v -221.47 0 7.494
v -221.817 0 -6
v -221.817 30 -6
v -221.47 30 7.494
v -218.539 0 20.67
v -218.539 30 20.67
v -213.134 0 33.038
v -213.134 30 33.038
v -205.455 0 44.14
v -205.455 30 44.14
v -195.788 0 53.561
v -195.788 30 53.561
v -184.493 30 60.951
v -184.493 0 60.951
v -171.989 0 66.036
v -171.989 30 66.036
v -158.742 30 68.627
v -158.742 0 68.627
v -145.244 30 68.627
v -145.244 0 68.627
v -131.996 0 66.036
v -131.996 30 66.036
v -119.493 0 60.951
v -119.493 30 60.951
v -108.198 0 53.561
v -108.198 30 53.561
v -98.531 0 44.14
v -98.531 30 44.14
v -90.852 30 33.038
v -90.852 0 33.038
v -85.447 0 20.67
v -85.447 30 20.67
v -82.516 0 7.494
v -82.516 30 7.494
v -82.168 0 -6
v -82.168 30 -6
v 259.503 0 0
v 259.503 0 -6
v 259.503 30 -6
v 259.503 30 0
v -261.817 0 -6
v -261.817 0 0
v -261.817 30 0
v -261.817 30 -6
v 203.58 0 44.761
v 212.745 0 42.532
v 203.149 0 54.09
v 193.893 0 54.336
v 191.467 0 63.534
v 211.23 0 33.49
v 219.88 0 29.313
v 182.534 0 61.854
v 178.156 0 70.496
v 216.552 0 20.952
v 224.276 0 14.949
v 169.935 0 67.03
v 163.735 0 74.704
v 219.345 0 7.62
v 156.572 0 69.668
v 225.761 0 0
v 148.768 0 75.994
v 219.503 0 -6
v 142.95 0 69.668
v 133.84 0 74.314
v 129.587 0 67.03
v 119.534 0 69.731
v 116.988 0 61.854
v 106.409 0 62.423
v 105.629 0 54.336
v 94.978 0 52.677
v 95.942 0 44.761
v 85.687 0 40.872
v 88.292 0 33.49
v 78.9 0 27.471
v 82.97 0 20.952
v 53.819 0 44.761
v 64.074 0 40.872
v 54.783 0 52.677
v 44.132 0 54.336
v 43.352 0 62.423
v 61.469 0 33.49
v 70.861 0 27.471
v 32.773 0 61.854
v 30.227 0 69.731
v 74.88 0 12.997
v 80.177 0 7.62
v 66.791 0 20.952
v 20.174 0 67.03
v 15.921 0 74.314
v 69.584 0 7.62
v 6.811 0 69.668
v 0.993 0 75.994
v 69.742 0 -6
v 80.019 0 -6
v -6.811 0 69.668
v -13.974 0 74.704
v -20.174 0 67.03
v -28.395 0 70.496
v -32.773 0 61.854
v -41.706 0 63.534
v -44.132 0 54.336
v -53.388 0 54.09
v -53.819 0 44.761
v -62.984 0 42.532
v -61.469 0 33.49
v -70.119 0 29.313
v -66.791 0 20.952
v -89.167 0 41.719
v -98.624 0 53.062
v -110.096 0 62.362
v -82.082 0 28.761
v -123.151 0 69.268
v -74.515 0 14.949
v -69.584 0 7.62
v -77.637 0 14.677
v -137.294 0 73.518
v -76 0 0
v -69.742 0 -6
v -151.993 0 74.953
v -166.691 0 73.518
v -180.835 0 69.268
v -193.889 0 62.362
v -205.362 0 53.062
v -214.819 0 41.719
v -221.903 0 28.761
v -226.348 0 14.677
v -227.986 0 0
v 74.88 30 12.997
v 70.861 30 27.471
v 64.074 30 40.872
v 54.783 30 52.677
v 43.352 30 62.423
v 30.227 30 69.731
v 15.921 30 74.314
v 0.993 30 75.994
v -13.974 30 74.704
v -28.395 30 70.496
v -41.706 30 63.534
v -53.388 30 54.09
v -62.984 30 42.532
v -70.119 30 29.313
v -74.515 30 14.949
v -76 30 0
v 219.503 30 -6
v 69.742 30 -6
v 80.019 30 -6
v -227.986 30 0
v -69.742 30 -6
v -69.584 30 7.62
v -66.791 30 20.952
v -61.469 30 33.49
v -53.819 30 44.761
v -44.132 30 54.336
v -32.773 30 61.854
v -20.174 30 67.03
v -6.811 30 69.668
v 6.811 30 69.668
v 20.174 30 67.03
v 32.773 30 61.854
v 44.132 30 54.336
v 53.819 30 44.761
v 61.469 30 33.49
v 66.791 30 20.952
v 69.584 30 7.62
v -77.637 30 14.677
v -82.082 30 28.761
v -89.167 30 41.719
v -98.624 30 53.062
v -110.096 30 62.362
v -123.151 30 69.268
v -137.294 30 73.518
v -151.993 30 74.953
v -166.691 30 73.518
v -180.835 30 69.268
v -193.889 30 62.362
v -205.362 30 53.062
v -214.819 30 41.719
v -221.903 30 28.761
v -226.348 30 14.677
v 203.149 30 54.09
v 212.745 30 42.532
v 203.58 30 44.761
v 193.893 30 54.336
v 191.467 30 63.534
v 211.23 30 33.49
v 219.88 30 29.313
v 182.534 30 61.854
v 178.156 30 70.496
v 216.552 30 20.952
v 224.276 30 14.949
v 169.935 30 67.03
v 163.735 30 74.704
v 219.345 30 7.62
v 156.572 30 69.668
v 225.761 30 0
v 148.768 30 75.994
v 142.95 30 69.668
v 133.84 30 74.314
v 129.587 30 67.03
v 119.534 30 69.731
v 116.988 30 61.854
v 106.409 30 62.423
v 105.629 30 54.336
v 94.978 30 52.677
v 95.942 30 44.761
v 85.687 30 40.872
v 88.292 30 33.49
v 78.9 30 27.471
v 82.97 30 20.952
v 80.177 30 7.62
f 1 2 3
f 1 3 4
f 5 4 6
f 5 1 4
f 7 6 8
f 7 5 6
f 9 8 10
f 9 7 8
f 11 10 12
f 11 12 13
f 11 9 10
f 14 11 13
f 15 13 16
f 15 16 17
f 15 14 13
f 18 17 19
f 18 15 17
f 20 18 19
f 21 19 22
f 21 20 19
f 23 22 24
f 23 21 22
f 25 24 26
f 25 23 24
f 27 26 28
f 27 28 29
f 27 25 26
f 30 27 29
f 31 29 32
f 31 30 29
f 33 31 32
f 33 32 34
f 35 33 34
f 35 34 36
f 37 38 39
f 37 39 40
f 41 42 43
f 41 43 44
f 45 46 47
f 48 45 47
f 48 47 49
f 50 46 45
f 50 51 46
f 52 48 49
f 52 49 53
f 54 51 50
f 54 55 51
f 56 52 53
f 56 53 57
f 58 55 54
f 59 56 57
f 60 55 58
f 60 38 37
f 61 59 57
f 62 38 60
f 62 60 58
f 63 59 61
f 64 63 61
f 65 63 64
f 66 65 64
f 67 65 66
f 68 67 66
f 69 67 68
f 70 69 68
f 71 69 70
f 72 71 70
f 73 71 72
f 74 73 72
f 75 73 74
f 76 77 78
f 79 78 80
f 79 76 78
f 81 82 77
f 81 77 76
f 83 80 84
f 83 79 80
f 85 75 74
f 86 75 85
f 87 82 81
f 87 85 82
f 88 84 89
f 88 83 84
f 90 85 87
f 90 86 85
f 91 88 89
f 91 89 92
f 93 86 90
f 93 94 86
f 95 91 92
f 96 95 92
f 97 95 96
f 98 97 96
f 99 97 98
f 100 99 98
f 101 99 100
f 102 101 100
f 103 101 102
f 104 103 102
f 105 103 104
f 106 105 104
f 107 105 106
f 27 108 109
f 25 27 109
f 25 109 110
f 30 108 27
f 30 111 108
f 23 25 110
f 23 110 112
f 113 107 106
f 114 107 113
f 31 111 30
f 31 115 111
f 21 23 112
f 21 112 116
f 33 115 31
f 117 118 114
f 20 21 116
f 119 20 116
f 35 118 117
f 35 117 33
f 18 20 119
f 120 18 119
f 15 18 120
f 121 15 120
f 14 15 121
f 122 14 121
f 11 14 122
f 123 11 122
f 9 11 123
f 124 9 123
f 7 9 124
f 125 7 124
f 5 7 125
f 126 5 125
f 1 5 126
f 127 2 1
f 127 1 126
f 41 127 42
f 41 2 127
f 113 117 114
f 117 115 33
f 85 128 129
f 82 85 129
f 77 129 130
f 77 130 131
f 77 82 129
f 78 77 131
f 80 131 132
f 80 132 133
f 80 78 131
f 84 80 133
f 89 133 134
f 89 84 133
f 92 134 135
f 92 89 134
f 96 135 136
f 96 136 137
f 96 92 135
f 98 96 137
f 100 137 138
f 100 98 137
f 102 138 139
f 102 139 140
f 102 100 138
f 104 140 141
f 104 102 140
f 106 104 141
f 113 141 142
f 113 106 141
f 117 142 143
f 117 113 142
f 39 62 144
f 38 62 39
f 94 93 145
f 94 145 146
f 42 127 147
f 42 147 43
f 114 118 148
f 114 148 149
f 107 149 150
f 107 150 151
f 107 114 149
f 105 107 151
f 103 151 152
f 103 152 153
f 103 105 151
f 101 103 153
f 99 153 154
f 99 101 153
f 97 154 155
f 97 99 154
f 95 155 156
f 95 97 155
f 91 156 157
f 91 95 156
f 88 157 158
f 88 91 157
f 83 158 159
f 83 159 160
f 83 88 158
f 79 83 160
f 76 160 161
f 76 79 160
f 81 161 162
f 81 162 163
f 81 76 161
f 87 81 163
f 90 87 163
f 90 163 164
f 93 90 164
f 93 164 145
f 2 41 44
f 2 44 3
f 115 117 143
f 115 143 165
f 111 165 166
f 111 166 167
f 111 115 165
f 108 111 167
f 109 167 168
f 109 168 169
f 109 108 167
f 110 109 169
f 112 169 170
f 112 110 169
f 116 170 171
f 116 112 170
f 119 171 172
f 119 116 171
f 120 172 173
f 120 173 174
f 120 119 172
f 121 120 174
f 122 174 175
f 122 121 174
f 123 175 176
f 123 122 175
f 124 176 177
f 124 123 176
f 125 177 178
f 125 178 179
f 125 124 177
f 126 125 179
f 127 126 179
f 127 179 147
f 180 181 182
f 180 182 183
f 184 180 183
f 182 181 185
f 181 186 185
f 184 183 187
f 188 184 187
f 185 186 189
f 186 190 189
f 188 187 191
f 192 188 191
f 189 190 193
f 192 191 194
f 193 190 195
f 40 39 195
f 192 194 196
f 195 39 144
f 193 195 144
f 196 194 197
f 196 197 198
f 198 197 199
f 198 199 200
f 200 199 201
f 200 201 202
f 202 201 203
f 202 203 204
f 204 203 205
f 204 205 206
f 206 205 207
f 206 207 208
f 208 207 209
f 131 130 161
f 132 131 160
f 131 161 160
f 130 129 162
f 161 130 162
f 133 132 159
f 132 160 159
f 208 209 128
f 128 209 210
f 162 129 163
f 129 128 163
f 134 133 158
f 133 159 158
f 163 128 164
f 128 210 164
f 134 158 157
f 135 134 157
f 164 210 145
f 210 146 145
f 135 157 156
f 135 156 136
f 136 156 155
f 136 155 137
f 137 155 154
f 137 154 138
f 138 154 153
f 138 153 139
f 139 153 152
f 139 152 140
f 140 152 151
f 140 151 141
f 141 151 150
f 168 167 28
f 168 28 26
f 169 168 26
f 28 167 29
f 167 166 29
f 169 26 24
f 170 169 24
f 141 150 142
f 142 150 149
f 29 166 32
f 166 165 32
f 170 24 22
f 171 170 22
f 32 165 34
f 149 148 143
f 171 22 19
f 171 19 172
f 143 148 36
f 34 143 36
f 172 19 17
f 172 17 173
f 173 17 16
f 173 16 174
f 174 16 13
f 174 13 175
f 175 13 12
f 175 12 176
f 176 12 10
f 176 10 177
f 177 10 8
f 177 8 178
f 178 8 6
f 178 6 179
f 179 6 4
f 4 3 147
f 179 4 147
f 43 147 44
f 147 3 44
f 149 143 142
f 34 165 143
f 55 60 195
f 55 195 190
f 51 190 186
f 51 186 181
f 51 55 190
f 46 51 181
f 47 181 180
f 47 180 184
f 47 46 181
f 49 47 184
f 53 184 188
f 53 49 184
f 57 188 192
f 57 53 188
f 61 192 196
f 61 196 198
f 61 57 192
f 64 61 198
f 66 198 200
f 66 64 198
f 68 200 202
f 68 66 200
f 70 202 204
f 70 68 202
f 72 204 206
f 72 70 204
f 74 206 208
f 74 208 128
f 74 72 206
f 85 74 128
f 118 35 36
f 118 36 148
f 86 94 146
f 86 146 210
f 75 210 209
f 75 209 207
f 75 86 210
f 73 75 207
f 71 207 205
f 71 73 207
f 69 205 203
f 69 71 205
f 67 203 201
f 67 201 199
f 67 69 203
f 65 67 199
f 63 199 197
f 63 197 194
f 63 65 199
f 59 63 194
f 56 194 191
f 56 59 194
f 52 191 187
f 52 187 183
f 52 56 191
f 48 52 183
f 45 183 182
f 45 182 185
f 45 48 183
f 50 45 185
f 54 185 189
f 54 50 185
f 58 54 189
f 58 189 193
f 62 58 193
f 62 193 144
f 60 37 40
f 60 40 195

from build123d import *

# Parameters (mm, degrees)
EXTRUDE_1_DEPTH = 30


with BuildPart() as part:
    # 草图3 → 凸台-拉伸1 (new body)
    with BuildSketch(Plane(origin=(0, 0, 0), x_dir=(1, 0, 0), z_dir=(0, 1, 0))):
        with BuildLine():
            Line((-227.985581002, 0), (-261.817326429, 0))
            Line((-261.817326429, 0), (-261.817326429, 6))
            Line((-261.817326429, 6), (-221.817326429, 6))
            ThreePointArc((-221.817326429, 6), (-151.992790501, -68.953199218), (-82.168254573, 6))
            Line((-82.168254573, 6), (-69.742383097, 6))
            ThreePointArc((-69.742383097, 6), (0, -70), (69.742383097, 6))
            Line((69.742383097, 6), (80.018614475, 6))
            ThreePointArc((80.018614475, 6), (149.760997572, -70), (219.503380668, 6))
            Line((219.503380668, 6), (259.503380668, 6))
            Line((259.503380668, 6), (259.503380668, 0))
            Line((259.503380668, 0), (225.760997572, 0))
            ThreePointArc((225.760997572, 0), (156.283347312, -75.71960746), (74.880498786, -12.996572686))
            ThreePointArc((74.880498786, -12.996572686), (-6.52234974, -75.71960746), (-76, 0))
            ThreePointArc((-76, 0), (-151.992790501, -74.953199218), (-227.985581002, 0))
        make_face()
    extrude(amount=EXTRUDE_1_DEPTH)


solid = part.part
